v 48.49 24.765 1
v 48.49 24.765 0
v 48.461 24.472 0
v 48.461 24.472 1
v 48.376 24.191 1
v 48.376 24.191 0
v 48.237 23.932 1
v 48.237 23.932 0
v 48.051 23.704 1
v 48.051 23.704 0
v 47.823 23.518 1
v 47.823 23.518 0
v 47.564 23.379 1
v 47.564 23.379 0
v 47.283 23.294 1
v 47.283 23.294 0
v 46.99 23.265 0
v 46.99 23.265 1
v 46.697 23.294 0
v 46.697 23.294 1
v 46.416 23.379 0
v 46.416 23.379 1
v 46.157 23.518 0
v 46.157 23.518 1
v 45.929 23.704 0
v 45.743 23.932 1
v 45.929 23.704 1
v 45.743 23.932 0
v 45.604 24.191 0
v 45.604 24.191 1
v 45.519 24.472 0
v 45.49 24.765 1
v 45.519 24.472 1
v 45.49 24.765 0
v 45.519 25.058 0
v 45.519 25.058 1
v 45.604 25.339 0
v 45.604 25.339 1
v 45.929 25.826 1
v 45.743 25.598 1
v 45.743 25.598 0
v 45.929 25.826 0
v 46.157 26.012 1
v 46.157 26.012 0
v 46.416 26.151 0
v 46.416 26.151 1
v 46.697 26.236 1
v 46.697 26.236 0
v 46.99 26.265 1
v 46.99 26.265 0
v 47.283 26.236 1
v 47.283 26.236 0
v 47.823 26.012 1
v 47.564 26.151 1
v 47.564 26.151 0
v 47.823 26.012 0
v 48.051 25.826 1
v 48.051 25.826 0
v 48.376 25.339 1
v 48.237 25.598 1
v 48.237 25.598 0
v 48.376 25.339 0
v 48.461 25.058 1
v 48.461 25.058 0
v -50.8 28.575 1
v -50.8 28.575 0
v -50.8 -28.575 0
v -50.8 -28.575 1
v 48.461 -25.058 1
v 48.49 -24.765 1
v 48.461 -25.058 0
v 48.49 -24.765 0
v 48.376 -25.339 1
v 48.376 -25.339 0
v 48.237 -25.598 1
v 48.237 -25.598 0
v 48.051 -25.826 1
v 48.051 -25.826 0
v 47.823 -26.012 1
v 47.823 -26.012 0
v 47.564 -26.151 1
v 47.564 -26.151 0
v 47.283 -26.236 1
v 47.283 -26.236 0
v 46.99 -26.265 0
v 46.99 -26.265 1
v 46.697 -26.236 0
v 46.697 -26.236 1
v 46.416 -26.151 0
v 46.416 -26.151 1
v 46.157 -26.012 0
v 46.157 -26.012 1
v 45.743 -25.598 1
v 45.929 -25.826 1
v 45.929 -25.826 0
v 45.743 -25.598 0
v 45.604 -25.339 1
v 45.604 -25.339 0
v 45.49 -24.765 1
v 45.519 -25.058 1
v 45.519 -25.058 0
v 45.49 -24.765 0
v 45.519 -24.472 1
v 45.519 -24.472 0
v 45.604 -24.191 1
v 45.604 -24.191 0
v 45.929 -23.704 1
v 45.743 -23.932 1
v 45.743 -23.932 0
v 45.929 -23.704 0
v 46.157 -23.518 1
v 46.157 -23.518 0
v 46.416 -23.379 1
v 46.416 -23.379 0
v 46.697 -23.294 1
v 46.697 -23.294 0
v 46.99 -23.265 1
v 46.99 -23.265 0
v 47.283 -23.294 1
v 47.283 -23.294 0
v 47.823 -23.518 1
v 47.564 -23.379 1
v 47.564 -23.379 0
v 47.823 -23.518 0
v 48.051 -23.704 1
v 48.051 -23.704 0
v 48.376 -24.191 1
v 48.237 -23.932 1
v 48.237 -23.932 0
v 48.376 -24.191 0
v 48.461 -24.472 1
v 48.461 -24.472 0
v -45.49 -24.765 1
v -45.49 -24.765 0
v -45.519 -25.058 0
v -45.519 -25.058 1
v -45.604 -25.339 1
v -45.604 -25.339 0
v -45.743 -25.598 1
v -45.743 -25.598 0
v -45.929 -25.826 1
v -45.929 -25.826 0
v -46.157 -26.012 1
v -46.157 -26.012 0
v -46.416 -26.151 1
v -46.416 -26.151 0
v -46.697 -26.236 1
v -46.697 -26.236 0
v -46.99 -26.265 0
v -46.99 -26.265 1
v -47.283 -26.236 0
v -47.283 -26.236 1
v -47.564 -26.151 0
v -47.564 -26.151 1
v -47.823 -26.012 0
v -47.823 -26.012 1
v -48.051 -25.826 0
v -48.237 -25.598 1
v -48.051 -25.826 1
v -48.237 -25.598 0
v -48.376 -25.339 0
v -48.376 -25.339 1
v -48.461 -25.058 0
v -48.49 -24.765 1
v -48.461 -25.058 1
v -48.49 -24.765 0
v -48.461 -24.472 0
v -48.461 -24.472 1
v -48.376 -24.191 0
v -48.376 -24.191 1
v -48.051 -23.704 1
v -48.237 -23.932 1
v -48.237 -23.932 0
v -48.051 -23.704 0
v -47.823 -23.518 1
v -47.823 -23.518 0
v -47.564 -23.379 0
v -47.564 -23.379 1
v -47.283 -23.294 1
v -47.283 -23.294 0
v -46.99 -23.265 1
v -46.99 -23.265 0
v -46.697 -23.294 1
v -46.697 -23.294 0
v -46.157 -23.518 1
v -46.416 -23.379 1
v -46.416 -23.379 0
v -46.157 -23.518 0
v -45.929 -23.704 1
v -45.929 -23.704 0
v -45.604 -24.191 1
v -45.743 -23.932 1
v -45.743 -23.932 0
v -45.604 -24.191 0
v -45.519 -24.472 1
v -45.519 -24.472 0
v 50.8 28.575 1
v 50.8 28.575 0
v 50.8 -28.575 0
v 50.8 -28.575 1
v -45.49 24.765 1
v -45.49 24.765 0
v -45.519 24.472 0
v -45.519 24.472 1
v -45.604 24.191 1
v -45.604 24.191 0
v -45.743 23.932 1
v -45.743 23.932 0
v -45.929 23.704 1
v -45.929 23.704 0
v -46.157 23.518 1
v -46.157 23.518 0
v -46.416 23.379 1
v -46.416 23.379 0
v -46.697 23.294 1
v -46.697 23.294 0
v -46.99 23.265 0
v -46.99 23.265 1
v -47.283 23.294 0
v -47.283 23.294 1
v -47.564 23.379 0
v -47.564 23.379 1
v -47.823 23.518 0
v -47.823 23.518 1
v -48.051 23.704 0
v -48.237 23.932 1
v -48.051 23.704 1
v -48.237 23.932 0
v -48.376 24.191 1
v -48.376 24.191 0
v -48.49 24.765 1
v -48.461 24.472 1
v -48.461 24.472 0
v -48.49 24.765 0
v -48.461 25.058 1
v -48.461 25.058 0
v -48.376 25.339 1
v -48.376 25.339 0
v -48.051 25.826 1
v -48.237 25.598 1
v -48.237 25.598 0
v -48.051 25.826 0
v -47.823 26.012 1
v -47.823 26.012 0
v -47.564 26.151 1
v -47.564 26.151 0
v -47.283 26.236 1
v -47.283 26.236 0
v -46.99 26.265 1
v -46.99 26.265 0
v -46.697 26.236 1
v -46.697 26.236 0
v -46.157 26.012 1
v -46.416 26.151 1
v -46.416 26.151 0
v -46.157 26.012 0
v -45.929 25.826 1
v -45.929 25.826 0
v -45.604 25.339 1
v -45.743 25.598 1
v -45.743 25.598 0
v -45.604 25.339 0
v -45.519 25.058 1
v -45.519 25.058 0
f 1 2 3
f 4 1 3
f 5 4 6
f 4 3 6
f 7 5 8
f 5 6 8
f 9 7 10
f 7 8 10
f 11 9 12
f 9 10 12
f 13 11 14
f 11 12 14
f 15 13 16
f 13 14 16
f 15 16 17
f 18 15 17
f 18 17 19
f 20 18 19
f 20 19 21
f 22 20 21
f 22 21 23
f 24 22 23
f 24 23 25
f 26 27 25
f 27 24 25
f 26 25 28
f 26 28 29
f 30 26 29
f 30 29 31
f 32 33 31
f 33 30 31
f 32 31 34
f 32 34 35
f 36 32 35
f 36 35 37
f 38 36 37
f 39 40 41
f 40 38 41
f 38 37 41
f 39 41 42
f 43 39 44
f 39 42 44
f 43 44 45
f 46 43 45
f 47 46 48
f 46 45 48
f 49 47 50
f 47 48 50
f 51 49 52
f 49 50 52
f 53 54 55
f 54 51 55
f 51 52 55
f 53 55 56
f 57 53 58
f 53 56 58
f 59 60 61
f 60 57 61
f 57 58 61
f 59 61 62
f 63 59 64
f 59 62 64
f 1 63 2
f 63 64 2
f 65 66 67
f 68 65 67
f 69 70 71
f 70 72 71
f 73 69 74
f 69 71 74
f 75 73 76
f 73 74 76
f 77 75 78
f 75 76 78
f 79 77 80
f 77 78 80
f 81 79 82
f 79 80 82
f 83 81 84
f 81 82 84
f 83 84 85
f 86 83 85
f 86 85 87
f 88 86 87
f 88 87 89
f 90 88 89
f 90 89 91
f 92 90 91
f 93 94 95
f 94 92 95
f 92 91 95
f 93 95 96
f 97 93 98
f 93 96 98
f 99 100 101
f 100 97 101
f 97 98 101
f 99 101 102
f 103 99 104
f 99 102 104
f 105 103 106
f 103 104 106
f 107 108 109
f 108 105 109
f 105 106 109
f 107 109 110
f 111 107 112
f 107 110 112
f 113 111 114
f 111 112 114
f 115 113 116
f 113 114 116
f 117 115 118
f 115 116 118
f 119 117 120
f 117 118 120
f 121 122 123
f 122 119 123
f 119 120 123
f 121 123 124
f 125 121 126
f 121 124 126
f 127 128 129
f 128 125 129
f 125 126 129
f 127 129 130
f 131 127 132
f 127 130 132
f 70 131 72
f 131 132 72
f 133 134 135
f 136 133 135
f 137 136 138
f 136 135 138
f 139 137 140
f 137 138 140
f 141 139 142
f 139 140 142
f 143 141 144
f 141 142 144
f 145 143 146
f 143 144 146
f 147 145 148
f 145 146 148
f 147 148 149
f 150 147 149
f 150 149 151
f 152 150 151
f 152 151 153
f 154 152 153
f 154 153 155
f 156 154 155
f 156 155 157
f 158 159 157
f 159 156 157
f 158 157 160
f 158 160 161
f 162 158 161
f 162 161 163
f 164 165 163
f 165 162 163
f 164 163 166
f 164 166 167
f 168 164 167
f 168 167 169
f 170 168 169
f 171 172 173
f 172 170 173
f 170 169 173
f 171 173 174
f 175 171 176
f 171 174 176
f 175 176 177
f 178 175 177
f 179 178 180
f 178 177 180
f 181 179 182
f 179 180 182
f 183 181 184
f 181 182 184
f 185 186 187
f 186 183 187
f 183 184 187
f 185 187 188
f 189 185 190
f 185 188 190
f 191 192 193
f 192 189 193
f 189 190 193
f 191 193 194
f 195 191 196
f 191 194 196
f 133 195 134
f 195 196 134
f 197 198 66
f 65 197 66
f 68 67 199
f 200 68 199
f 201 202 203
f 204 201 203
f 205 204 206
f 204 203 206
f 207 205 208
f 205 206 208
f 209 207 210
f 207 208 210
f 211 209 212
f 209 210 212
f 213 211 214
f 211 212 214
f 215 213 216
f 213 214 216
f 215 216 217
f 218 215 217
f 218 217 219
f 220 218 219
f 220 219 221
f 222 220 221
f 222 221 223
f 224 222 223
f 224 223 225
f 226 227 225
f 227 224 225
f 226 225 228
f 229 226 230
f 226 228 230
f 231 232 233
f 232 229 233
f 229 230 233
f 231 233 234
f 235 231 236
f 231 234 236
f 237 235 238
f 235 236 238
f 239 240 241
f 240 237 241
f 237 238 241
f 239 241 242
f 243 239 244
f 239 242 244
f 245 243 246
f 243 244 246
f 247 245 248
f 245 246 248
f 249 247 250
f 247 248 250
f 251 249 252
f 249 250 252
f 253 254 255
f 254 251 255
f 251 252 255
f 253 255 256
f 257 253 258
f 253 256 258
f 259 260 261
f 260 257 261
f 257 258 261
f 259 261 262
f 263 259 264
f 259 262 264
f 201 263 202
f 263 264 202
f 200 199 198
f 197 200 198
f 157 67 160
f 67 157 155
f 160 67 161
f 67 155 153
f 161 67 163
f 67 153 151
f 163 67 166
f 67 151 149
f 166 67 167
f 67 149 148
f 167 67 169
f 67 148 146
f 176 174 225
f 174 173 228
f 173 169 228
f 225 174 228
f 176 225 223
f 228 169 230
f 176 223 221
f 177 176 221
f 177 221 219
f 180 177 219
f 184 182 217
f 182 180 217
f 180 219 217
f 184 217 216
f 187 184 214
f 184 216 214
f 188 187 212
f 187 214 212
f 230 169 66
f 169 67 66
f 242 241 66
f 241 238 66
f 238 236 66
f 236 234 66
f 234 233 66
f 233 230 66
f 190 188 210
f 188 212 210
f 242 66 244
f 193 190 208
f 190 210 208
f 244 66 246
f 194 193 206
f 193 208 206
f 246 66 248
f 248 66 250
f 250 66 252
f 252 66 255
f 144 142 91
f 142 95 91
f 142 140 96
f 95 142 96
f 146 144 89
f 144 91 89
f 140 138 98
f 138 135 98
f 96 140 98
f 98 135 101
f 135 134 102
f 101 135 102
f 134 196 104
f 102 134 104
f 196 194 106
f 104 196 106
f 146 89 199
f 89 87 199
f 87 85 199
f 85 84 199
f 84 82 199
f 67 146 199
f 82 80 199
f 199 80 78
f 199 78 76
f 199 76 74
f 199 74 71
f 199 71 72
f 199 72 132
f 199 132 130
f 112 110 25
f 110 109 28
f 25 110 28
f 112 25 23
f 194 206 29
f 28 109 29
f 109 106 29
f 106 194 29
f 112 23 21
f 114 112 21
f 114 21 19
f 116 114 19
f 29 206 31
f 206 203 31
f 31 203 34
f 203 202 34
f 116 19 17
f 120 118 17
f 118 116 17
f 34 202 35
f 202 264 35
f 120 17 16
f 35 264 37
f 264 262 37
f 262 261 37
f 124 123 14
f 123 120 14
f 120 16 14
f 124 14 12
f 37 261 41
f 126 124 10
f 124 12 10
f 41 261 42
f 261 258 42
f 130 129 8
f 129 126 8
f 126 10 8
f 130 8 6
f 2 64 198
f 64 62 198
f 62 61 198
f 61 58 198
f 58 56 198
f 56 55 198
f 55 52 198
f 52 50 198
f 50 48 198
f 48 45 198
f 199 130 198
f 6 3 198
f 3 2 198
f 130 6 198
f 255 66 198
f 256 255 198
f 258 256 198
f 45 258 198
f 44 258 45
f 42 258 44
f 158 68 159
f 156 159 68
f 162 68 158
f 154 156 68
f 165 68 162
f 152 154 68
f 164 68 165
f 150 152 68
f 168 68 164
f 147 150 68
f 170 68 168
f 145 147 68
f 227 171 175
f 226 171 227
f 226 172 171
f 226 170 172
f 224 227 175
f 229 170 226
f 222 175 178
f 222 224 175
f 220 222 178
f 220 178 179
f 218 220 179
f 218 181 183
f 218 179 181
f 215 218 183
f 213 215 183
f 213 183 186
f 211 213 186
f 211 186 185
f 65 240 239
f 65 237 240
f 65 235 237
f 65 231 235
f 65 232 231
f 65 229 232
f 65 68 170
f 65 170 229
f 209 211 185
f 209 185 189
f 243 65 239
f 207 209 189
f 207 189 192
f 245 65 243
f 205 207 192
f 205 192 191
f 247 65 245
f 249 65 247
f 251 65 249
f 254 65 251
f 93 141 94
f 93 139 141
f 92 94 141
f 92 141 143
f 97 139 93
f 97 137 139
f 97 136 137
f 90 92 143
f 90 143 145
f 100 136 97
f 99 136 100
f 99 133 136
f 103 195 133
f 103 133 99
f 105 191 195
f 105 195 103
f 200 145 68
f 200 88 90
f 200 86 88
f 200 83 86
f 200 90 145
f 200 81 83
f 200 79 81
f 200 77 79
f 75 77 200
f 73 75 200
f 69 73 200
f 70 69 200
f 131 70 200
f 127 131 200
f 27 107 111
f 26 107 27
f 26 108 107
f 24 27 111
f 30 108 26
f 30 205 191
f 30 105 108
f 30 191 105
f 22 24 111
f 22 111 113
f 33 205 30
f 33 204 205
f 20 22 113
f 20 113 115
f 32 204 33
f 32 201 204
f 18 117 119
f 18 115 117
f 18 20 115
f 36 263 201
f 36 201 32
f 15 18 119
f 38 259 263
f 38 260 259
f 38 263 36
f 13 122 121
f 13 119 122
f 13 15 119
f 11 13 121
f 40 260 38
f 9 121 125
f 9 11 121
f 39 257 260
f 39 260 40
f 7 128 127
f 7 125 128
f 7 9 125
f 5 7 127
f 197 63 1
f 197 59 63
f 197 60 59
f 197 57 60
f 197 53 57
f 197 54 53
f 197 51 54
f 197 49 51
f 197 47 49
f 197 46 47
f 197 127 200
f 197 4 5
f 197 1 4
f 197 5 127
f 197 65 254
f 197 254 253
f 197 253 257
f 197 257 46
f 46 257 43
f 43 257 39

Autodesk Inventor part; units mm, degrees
ref_plane "YZ Plane" through (0, 0, 0) normal (1, 0, 0) x (0, 1, 0)
ref_plane "XZ Plane" through (0, 0, 0) normal (0, 1, 0) x (-1, 0, 0)
ref_plane "XY Plane" through (0, 0, 0) normal (0, 0, 1) x (1, 0, 0)
sketch "Sketch1" plane through (0, 0, 0) normal (0, 0, 1) x (1, 0, 0)
  line L0 (-50.8, -28.575) -> (50.8, -28.575)
  line L1 (50.8, -28.575) -> (50.8, 28.575)
  line L2 (50.8, 28.575) -> (-50.8, 28.575)
  line L3 (-50.8, 28.575) -> (-50.8, -28.575)
  line L4 (-50.8, -28.575) -> (50.8, 28.575) construction
  line L5 (50.8, -28.575) -> (-50.8, 28.575) construction
  circle A0 centre (-46.99, 24.765) radius 1.5
  line L6 (-50.8, 0) -> (50.8, 0) construction
  line L7 (0, 28.575) -> (0, -28.575) construction
  circle A1 centre (-46.99, -24.765) radius 1.5
  circle A2 centre (46.99, 24.765) radius 1.5
  circle A3 centre (46.99, -24.765) radius 1.5
  point P0 (0, 0)
  dimension "d2" = 101.6
  dimension "d4" = 57.15
  dimension "d5" = 49.53
  dimension "d6" = 3
  dimension "d7" = 93.98
extrude "Extrusion1" add sketch "Sketch1" along normal blind 1
properties part number "Microzed01" material "PCB(1)"
